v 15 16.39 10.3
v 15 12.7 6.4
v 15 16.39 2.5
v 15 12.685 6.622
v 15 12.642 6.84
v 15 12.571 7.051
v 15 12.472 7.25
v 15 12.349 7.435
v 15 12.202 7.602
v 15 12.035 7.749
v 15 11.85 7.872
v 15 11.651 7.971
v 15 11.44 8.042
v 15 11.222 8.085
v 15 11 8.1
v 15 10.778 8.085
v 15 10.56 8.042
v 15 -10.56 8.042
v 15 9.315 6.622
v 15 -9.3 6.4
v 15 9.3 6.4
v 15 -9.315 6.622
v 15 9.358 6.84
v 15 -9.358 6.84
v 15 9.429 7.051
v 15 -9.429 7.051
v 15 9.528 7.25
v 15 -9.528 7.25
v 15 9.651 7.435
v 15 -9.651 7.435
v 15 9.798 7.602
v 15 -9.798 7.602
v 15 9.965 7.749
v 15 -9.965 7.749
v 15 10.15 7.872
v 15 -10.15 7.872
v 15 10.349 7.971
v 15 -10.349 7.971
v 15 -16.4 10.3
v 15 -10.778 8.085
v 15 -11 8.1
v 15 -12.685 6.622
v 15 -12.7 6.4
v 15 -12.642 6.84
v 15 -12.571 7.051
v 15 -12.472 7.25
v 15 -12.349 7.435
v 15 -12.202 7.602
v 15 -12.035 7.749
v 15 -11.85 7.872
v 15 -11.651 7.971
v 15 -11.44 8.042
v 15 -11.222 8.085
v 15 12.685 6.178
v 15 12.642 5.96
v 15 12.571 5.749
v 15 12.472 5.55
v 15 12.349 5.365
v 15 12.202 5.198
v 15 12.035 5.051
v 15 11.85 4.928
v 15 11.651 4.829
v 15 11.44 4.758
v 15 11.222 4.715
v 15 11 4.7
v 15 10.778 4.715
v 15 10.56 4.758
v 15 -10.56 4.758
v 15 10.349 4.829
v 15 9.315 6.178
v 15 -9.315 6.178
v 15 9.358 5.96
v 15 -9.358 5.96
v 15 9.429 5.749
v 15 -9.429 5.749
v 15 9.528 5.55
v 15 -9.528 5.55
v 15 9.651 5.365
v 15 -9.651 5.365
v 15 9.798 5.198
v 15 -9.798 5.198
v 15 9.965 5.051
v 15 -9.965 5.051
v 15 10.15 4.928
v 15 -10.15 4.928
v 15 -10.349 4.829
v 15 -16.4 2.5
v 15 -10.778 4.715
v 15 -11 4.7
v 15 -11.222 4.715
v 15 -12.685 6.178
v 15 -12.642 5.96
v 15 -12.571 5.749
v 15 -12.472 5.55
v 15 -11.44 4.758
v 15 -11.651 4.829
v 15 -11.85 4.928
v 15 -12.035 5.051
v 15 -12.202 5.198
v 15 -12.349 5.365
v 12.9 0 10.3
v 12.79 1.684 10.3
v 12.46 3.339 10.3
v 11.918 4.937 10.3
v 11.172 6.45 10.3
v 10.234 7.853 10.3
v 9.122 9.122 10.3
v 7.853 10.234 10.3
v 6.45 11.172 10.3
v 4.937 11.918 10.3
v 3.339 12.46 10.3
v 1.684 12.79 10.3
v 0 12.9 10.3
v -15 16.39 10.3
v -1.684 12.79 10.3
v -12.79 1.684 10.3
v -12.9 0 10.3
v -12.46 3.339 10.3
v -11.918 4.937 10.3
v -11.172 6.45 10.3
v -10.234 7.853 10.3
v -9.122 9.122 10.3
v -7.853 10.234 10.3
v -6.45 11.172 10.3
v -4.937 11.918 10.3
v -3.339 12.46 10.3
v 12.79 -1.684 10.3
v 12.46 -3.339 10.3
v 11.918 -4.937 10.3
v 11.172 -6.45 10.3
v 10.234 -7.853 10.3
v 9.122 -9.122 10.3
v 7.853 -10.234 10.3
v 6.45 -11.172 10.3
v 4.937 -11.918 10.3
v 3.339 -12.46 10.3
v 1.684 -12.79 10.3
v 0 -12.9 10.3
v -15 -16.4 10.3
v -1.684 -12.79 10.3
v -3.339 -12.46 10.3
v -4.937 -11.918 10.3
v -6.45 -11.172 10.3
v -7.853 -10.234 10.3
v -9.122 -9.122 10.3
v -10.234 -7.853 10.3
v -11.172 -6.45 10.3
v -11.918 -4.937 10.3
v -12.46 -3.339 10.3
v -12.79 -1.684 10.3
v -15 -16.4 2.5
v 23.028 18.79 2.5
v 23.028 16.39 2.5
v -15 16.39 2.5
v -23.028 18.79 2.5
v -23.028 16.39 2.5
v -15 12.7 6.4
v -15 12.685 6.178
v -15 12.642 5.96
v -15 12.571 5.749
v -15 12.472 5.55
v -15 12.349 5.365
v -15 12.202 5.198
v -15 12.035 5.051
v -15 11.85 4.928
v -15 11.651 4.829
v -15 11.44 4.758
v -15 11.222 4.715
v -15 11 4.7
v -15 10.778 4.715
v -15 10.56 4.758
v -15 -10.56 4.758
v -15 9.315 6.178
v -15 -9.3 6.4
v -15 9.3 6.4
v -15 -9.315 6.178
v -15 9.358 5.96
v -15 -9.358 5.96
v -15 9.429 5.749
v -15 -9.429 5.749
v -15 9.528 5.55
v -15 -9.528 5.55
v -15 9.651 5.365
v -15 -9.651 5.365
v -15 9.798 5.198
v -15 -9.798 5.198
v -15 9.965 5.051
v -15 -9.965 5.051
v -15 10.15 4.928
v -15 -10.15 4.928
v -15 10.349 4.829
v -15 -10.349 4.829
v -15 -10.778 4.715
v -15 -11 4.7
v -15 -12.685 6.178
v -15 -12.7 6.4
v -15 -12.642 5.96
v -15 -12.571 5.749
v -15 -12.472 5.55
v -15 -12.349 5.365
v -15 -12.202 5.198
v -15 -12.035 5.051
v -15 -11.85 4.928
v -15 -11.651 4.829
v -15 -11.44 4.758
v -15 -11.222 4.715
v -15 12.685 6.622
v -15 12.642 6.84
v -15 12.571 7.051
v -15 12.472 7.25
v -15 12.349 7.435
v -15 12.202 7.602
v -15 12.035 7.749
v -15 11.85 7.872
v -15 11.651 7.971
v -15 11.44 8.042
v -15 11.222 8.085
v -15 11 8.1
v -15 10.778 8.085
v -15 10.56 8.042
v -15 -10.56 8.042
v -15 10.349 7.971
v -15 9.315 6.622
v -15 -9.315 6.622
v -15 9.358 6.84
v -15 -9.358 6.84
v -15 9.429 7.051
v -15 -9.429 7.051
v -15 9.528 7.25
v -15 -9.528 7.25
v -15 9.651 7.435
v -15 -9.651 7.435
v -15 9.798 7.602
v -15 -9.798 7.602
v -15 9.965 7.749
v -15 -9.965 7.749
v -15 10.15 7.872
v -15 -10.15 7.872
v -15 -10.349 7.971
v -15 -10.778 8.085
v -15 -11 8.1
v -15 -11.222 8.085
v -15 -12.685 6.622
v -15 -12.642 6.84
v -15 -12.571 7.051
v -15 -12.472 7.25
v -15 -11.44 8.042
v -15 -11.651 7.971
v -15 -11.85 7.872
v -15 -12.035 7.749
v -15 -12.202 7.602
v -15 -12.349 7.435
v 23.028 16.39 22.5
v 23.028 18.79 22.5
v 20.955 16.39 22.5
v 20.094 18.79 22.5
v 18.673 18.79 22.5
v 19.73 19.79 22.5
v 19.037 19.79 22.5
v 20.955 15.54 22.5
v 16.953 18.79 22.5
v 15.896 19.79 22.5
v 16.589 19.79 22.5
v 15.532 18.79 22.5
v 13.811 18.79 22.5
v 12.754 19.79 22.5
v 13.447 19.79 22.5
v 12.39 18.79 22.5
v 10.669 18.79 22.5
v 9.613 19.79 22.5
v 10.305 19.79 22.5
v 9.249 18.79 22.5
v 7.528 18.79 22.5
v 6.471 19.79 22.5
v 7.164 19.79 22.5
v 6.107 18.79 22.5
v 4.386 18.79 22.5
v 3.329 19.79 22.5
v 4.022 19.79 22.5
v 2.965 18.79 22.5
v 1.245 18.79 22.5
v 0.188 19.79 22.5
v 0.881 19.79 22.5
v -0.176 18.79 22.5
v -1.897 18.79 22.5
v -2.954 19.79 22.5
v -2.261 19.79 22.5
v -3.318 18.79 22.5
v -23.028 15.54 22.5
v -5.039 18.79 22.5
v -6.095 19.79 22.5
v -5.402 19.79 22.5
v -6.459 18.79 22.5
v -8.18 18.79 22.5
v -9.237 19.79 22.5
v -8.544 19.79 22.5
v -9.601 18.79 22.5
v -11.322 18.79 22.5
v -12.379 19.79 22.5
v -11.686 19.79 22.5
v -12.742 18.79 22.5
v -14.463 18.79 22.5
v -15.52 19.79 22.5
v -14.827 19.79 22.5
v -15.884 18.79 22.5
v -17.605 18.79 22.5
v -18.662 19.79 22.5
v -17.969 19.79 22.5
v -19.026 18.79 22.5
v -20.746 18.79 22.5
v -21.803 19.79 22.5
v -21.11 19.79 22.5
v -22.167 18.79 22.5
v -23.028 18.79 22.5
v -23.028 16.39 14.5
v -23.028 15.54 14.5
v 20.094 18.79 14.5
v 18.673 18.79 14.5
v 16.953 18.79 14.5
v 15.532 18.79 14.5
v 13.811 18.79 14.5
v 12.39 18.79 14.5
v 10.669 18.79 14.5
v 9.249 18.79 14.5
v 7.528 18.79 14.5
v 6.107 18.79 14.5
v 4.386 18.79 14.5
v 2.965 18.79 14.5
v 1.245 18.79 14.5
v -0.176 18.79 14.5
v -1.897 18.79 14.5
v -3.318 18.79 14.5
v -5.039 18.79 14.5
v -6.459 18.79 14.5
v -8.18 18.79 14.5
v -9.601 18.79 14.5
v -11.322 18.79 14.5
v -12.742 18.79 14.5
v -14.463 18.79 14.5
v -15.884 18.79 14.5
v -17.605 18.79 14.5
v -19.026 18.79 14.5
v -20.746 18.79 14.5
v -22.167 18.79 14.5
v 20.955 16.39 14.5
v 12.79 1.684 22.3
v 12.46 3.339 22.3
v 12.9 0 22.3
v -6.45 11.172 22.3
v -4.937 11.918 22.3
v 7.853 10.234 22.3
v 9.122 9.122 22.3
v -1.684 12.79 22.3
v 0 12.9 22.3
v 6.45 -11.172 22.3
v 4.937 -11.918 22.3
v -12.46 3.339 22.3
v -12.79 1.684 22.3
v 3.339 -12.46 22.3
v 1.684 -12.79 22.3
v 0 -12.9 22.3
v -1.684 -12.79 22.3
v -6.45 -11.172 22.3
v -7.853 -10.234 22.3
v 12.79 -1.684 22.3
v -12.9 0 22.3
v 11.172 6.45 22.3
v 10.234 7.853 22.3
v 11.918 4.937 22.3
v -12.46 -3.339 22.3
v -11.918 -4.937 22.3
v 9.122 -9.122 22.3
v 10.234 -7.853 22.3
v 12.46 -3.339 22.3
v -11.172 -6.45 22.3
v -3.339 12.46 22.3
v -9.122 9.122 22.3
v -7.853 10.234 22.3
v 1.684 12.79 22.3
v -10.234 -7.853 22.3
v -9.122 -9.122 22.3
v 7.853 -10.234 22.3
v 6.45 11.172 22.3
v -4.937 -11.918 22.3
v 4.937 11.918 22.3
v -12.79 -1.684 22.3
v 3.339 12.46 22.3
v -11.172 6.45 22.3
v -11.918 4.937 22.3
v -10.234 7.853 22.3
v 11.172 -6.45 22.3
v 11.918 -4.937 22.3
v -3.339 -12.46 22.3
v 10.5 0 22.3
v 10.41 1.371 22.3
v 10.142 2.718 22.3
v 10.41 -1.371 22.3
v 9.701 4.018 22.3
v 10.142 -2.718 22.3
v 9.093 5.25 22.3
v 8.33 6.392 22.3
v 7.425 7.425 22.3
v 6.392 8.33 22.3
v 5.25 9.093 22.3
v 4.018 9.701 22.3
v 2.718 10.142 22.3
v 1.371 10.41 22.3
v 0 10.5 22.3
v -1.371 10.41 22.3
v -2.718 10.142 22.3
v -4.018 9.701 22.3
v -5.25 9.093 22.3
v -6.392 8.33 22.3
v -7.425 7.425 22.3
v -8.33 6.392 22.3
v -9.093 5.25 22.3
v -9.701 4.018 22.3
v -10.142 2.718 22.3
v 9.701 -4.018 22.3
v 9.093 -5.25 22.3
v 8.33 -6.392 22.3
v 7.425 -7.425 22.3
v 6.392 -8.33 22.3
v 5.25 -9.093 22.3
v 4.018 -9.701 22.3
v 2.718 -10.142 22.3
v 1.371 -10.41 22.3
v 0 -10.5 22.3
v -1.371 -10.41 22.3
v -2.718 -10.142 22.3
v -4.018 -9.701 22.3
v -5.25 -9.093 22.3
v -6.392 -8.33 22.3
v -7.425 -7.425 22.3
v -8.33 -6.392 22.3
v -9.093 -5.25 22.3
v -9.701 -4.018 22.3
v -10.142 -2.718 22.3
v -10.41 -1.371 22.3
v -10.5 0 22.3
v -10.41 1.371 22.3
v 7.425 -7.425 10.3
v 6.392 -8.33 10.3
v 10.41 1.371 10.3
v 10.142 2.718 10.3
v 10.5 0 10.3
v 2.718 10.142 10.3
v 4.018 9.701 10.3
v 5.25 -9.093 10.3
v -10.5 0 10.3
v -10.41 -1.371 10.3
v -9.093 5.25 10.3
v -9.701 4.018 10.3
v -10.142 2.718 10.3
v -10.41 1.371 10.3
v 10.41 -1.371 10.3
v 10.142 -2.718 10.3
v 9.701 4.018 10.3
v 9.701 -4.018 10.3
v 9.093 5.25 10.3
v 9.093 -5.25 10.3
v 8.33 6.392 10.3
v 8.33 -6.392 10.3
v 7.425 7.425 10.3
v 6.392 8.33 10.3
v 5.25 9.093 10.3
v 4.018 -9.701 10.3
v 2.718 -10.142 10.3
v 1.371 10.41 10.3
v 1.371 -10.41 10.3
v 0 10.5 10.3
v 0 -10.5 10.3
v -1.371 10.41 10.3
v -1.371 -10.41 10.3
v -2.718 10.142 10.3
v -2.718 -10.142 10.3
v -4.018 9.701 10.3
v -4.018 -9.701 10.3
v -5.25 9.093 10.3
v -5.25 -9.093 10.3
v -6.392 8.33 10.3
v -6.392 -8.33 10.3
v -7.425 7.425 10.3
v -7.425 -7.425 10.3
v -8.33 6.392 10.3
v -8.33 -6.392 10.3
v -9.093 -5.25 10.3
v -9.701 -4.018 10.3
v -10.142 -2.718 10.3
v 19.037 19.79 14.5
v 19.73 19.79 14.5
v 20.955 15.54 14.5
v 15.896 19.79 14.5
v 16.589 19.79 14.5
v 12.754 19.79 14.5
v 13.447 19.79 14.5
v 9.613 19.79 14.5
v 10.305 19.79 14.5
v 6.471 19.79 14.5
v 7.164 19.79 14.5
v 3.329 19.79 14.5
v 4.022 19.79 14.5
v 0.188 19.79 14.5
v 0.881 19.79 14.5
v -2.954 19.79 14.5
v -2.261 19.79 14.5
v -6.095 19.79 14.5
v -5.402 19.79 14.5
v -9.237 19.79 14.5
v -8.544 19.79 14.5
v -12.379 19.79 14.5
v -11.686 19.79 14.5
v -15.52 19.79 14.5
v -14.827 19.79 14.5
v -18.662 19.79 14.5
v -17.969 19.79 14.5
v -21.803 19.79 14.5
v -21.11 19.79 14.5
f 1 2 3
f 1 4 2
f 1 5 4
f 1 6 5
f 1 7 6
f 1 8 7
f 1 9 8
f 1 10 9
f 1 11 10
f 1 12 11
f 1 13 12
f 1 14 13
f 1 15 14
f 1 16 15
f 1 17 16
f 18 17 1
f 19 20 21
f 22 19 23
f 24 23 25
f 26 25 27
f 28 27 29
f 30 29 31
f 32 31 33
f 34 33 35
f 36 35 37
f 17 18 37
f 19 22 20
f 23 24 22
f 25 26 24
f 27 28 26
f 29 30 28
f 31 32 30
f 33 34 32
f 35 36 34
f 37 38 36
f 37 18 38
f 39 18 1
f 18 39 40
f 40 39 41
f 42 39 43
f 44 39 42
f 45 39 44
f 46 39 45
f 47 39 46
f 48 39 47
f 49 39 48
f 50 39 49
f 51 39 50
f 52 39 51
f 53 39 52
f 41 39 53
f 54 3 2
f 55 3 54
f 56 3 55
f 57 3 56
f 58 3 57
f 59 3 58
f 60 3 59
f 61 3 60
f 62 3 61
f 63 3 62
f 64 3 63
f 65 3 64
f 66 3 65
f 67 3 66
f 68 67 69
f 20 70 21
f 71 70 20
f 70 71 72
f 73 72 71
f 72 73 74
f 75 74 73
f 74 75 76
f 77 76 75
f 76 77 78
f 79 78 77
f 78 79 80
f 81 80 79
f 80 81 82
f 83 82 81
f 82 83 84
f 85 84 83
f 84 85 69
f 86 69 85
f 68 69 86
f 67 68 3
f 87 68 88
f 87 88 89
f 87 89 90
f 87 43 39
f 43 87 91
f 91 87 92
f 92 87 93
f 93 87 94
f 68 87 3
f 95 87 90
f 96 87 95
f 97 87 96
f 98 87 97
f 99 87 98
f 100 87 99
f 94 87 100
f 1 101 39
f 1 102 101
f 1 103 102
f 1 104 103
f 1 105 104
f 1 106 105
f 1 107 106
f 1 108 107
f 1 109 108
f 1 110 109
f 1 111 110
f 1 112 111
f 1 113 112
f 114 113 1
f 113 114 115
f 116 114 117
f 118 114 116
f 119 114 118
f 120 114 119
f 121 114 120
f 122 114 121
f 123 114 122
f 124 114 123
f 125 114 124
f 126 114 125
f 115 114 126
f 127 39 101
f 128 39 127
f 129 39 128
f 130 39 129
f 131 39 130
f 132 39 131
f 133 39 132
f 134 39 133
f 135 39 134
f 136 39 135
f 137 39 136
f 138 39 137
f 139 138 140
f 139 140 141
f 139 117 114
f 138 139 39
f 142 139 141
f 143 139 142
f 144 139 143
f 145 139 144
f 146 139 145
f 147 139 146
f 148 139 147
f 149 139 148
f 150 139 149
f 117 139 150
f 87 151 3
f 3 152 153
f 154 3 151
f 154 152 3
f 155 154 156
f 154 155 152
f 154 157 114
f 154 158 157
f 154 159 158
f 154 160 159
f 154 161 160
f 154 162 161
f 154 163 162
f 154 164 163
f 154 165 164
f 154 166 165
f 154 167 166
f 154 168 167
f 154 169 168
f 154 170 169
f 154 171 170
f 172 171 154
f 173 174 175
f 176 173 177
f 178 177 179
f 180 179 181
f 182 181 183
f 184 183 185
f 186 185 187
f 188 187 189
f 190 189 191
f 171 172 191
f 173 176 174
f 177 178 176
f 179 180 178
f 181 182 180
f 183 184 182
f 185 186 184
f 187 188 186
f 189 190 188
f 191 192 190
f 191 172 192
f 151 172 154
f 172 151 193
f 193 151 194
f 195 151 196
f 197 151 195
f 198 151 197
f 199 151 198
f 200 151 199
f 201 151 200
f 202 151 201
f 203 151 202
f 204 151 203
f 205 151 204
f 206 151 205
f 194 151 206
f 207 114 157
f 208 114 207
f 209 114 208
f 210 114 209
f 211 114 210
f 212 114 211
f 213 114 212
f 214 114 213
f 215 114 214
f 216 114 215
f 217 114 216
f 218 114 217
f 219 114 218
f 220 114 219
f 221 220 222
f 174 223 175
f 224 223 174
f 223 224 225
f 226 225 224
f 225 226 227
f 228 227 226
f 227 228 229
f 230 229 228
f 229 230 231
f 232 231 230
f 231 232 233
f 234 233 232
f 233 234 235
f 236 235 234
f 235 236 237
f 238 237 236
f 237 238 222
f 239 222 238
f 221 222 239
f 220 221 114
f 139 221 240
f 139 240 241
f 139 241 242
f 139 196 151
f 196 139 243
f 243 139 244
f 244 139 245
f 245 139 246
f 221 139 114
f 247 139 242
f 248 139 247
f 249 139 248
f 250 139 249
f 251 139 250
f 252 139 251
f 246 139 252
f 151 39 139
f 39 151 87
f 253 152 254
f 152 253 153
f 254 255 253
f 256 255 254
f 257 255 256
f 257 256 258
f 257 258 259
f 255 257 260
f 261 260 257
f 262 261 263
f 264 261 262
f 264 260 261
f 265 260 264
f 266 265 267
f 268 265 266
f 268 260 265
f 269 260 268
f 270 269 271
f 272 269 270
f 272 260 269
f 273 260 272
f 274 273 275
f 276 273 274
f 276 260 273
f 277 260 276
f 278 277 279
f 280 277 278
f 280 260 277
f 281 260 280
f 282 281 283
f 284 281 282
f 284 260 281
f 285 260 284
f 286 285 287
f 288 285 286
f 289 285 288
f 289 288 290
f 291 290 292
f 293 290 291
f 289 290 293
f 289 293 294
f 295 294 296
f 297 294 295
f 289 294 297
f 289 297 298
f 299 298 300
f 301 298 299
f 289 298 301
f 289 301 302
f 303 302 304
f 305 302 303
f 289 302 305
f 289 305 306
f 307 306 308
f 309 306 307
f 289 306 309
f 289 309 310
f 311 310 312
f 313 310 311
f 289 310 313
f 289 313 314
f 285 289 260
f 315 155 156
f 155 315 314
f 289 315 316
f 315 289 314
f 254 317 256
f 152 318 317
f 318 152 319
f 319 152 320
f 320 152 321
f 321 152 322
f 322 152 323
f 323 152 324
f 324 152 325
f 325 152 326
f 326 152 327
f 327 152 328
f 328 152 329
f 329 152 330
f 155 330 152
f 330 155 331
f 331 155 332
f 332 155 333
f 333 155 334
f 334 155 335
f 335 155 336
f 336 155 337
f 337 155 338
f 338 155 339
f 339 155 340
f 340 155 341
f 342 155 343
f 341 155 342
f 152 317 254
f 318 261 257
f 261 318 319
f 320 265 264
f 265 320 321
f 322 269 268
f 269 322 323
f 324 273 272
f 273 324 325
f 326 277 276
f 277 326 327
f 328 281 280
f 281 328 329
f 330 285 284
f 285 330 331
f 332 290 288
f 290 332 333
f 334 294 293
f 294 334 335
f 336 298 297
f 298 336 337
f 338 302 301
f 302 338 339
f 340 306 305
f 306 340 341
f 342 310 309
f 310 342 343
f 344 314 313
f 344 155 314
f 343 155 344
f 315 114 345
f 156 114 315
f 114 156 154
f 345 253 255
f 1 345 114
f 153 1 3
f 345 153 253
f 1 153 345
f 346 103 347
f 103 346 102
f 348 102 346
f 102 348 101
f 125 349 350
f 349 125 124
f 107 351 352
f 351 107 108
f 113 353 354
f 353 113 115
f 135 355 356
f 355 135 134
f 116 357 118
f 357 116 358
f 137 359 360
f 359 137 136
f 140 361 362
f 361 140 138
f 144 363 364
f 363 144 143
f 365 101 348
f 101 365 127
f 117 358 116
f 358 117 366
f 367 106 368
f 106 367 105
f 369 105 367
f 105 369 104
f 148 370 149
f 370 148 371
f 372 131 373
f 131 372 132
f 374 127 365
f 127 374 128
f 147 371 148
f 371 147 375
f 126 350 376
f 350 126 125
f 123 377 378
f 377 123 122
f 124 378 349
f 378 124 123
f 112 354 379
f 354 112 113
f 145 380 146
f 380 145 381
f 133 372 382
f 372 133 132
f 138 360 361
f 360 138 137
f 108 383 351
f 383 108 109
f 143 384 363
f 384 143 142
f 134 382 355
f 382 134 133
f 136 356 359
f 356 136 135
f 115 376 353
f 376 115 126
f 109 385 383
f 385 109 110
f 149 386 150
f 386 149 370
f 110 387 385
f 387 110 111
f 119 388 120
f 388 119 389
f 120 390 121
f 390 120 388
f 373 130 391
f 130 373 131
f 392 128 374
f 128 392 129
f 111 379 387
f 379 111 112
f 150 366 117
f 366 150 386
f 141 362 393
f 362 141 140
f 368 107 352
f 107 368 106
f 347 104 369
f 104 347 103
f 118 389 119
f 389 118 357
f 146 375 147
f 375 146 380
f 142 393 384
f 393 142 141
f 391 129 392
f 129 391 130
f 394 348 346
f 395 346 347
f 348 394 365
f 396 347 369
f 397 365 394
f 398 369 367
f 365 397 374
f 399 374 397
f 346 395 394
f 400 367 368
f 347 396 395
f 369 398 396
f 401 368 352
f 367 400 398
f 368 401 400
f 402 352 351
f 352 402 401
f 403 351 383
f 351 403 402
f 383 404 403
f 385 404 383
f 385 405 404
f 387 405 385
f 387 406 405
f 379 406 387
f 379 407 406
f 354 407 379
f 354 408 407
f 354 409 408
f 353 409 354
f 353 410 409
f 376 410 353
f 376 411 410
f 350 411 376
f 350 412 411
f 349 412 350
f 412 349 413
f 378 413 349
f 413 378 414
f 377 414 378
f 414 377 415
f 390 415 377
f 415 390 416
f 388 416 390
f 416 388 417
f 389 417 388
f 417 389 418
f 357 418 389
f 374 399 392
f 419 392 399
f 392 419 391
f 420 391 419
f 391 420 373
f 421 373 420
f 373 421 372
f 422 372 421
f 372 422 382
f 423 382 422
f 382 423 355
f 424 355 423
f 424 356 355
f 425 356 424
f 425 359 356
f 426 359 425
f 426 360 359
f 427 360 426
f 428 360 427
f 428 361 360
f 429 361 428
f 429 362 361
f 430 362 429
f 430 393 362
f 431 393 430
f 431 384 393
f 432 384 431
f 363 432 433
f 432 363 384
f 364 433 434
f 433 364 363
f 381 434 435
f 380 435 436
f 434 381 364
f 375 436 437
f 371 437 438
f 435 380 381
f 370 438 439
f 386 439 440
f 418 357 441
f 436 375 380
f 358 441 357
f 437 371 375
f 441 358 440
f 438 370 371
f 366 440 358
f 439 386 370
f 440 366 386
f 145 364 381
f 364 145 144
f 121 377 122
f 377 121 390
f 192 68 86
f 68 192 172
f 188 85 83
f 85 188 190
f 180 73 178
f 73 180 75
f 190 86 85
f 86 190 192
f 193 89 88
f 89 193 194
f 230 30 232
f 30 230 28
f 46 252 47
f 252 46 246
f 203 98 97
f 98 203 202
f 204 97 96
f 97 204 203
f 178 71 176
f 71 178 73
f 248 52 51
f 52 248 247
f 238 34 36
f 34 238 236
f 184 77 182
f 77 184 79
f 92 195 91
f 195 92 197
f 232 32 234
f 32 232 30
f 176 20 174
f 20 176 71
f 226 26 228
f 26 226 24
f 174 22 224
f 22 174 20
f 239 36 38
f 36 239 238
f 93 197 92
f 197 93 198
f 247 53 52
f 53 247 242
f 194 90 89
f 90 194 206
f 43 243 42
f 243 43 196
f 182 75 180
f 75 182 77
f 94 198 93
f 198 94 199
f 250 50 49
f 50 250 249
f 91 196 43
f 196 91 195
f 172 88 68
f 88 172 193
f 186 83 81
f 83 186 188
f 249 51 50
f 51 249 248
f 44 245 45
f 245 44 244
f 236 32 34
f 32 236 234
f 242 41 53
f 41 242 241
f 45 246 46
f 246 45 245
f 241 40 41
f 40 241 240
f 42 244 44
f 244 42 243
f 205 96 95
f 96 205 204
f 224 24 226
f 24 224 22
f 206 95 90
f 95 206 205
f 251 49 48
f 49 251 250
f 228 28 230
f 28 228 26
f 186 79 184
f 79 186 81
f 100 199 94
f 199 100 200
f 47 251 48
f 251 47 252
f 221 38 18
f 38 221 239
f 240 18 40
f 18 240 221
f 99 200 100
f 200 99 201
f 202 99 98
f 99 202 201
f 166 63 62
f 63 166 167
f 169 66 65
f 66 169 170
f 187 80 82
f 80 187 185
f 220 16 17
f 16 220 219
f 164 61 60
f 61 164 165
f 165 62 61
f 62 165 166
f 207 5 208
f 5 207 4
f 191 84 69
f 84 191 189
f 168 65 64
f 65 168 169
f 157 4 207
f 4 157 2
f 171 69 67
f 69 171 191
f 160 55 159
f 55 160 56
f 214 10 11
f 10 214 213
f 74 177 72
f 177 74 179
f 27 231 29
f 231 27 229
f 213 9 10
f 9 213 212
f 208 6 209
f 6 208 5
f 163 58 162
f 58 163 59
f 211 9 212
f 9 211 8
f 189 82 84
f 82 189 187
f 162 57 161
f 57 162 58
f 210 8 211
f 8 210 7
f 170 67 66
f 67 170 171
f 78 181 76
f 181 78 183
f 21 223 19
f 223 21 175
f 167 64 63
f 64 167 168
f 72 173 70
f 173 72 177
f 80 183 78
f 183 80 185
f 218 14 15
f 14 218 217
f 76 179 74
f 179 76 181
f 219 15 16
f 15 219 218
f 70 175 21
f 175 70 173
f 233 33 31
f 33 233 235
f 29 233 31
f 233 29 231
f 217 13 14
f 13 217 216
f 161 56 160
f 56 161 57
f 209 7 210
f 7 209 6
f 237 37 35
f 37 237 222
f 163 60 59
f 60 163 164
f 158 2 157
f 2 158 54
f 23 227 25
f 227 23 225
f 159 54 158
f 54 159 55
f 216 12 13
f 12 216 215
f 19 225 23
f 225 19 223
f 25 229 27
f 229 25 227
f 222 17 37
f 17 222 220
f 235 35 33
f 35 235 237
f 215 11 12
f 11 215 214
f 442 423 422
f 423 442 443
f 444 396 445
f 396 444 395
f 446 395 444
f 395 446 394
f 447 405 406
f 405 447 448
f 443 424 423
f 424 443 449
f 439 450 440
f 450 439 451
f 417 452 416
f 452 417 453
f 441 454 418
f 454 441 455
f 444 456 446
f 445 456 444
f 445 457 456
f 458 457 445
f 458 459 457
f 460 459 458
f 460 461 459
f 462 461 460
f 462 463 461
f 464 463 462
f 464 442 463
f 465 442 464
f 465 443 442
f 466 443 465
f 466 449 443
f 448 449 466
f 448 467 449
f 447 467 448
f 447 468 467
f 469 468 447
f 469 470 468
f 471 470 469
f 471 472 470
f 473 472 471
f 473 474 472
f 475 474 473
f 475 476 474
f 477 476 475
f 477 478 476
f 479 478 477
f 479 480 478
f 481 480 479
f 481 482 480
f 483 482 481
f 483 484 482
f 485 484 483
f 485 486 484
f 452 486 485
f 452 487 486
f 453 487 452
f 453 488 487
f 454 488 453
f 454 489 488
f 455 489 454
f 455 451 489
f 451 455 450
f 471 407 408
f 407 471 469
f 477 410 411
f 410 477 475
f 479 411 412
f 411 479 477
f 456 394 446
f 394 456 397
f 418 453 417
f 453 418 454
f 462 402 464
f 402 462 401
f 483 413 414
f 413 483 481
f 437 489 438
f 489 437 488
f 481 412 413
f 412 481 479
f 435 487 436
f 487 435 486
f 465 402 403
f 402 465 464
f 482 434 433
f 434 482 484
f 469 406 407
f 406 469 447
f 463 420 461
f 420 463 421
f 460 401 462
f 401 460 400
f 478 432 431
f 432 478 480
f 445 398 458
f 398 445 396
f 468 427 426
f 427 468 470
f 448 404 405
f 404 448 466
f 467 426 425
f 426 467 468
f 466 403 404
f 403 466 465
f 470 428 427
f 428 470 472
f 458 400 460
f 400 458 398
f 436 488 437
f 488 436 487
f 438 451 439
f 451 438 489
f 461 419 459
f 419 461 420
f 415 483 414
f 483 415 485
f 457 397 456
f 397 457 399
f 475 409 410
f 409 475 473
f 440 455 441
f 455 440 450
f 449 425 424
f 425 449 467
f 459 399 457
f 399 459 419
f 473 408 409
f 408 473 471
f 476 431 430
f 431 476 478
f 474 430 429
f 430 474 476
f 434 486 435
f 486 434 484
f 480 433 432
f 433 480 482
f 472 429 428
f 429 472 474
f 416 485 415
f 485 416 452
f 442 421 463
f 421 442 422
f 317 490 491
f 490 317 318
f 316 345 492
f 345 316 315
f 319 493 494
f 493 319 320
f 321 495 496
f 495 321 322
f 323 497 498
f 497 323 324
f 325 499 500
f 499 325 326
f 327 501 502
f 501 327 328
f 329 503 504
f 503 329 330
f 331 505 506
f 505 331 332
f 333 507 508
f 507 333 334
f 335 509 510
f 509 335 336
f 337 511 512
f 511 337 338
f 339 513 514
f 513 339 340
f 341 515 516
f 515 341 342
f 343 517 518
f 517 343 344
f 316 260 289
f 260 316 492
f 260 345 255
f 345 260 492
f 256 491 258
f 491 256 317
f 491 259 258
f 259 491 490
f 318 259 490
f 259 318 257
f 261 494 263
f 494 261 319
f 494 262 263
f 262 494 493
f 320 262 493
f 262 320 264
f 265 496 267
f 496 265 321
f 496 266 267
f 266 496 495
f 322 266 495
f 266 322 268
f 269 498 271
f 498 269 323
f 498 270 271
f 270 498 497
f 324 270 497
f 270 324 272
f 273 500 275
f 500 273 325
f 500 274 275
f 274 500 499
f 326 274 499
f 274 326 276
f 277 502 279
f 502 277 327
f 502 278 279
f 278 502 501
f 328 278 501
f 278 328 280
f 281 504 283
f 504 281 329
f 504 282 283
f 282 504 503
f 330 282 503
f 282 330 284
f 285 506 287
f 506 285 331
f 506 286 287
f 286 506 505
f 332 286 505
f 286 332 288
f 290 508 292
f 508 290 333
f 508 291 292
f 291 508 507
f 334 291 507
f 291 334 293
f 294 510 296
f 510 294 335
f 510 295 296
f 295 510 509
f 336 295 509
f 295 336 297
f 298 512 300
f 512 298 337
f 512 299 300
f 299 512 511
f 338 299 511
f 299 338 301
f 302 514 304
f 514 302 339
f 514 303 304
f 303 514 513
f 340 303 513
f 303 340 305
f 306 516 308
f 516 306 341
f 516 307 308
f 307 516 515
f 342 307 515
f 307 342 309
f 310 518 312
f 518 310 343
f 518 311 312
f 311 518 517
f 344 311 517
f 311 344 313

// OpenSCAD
/* =====================================================================
   Bittle CoM-Shift Harness  —  parametric v0
   Single Petoi P1S servo · rack-and-pinion linear slider · diagonal mount
   ---------------------------------------------------------------------
   Units: millimetres, degrees.  Print PLA/PETG for v0.
   Use a STEEL guide rod (rod_dia) rather than printing the sliding
   surface — printed-on-printed prismatic joints bind badly.

   TWO THINGS TO VERIFY ON THE BENCH (not trustworthy from the render):
     1. Pinion<->rack CENTRE DISTANCE. Tune with 'backlash'/'center_extra'.
     2. Z registration of pinion face vs rack face ('mesh_z').
   Everything else is dimensionally driven by the parameters below.
   ===================================================================== */

/* ---------- PART SELECTOR ------------------------------------------ */
// "layout" = assembled visualisation; the rest export a single flat part
part = "carriage";   // ["layout","base","carriage","pinion","rack"]

/* ---------- ROBOT / DECK ------------------------------------------- */
deck_len   = 100;  // electronics deck, long edge  (measure next week)
deck_wid   = 50;   // electronics deck, short edge
robot_mass = 290;  // g, bare Bittle
mech_mass  = 45;   // g, est. servo + harness + rack (refine after weighing)
m_shift    = 100;  // g, swappable payload slug  <-- your independent variable

/* ---------- SERVO (Petoi P1S: 30x24x12, 270 deg, 3 kg.cm) ---------- */
servo_l = 30; servo_w = 24; servo_h = 12;  // body envelope
servo_travel  = 270;                        // usable degrees
servo_shaft_d = 5;                          // shaft / horn-boss clearance

/* ---------- GEAR --------------------------------------------------- */
gear_module    = 1.0;   // >=1 so printed teeth survive
pinion_teeth   = 17;    // pitch dia = module * teeth
pressure_angle = 20;
pinion_face    = 6;     // pinion thickness  (Z)
rack_face      = 8;     // rack tooth height (Z)
backlash       = 0.15;  // mm, thinned per flank
center_extra   = 0.0;   // mm, add to centre distance to loosen mesh

/* ---------- GUIDE / CARRIAGE --------------------------------------- */
rod_dia       = 3.0;    // steel guide rods
rod_spacing   = 22;     // centre-to-centre (anti-rotation)
carriage_len  = 30;
mass_pocket_d = 21;     // shallow well for stacked ~20mm washers / M6 nuts
mass_pocket_h = 12;     // keep shallow: taller = higher CoM = tippier
clr           = 0.4;    // general slip-fit clearance

/* ---------- BASE --------------------------------------------------- */
base_th      = 2.5;
strap_slot_w = 4;       // velcro / zip-tie slots to strap over the deck
wall         = 2.4;

$fn = 48;

/* ========================= DERIVED ================================= */
pitch_r  = gear_module * pinion_teeth / 2;
stroke   = pitch_r * servo_travel * PI / 180;      // rack travel for full sweep
M_total  = robot_mass + mech_mass + m_shift;
dx_com   = m_shift * stroke / M_total;             // 1-D CoM shift magnitude
diag_ang = atan2(deck_wid, deck_len);              // diagonal orientation
rack_len = stroke + 6 * gear_module;               // keep meshed across travel

// carriage cross-width (Y): must clear both rods AND the mass well
cw = max(rod_spacing + 2*rod_dia + 2*wall, mass_pocket_d + 2*wall + 2);

// heights
rod_z   = base_th + rod_dia/2 + wall;              // rod centreline above plate
mesh_z  = base_th + servo_h;                       // servo lies flat, shaft up
y_rack  = cw/2 + wall;                             // rack pitch-line Y (local, at wall face)
y_pin   = y_rack + pitch_r + center_extra;         // pinion centre Y (local)
RL      = (stroke + carriage_len)/2 + 8;           // rail half-length

echo(str(">>> pinion pitch dia = ", 2*pitch_r, " mm"));
echo(str(">>> usable stroke    = ", stroke, " mm  over ", servo_travel, " deg"));
echo(str(">>> diagonal angle   = ", diag_ang, " deg (fore/aft:lateral set by deck)"));
echo(str(">>> total mass       = ", M_total, " g"));
echo(str(">>> predicted CoM shift = ", dx_com, " mm  @ ", m_shift, " g payload"));

/* ========================= GEAR MATH =============================== */
function polar(r,a) = [r*cos(a), r*sin(a)];
function rot2(p,a)  = [p[0]*cos(a)-p[1]*sin(a), p[0]*sin(a)+p[1]*cos(a)];
function inv_deg(a) = (tan(a) - a*PI/180) * 180/PI;   // involute fn, deg->deg

gsteps = 14;
function flank(br,ar) =
   let(t_out = acos(br/ar))
   [ for(i=[0:gsteps]) let(t = i/gsteps*t_out, r = br/cos(t))
        polar(r, inv_deg(t)) ];

// involute spur pinion, centred on origin, in XY.
// Built as SOLID HUB + narrowing teeth so it extrudes to a closed manifold.
module pinion_2d(){
   pr = pitch_r;
   br = pr*cos(pressure_angle);          // base circle
   ar = pr + gear_module;                // addendum (outer) radius
   rr = pr - 1.25*gear_module;           // root radius
   bl_ang   = (backlash/pr)*180/PI;      // backlash expressed as angle
   half     = 90/pinion_teeth - bl_ang/2;// half-tooth angular width at pitch
   base_ang = half + inv_deg(pressure_angle);
   t_out    = acos(br/ar);
   // flank root->tip, +side; angle DECREASES with radius so teeth narrow
   left  = concat([ polar(rr, base_ang) ],
                  [ for(i=[0:gsteps]) let(t=i/gsteps*t_out, r=br/cos(t))
                       polar(r, base_ang - inv_deg(t)) ]);
   right = [ for(i=[len(left)-1:-1:0]) [left[i][0], -left[i][1]] ]; // tip->root, mirrored
   tooth = concat(left, right);
   union(){
      circle(r = rr + 0.02);             // solid hub the teeth attach to
      for(k=[0:pinion_teeth-1]) rotate(k*360/pinion_teeth) polygon(tooth);
   }
}

module pinion(){
   difference(){
      linear_extrude(pinion_face) pinion_2d();
      translate([0,0,-1]) cylinder(d=servo_shaft_d+clr, h=pinion_face+2); // shaft clr
      // counterbore to seat a metal servo horn (bolt the pinion to it)
      translate([0,0,pinion_face-2.5]) cylinder(d=16, h=3);
      // 4x M2 bolt circle for the horn
      for(k=[0:3]) rotate(k*90) translate([6,0,-1]) cylinder(d=2.2, h=pinion_face+2);
   }
}

// straight-flank rack (exact conjugate of the involute pinion), teeth +Y
module rack_2d(len){
   p   = PI*gear_module;                 // circular pitch
   n   = floor(len/p);
   add = gear_module;                    // addendum (up)
   ded = 1.25*gear_module;               // dedendum (down)
   ht  = p/4 - backlash/2;               // half tooth thickness at pitch line
   base_h = 2;                           // solid backing below root
   union(){
      translate([0, -(ded+base_h)]) square([n*p, base_h]);          // backing strip
      for(i=[0:n-1]) let(cx=(i+0.5)*p)
         polygon([[cx-(ht+ded*tan(pressure_angle)), -ded],
                  [cx-(ht-add*tan(pressure_angle)),  add],
                  [cx+(ht-add*tan(pressure_angle)),  add],
                  [cx+(ht+ded*tan(pressure_angle)), -ded]]);
   }
}
module rack(){ linear_extrude(rack_face) rack_2d(rack_len); }

/* ========================= CARRIAGE ================================ */
// slides on the two rods (X), carries the rack wall (+Y) and the mass well
module carriage(){
   ch = rod_dia + 2*wall;                        // body height around rods
   wall_h = mesh_z + rack_face;                  // rack wall rises to mesh plane
   difference(){
      union(){
         // body block straddling the rods
         translate([-carriage_len/2, -cw/2, base_th]) cube([carriage_len, cw, ch]);
         // tall +Y wall that carries the rack up at the mesh plane
         translate([-rack_len/2, cw/2-0.01, base_th])
            cube([rack_len, wall, wall_h-base_th]);
         // mass well (cup) centred on the carriage
         translate([0,0,base_th])
            cylinder(d=mass_pocket_d+2*wall, h=ch+mass_pocket_h);
      }
      // rod bores (slip fit)
      for(sy=[-1,1])
         translate([-carriage_len/2-1, sy*rod_spacing/2, base_th+ch/2])
            rotate([0,90,0]) cylinder(d=rod_dia+clr, h=carriage_len+2);
      // mass pocket cavity, open from top
      translate([0,0,base_th+ch]) cylinder(d=mass_pocket_d, h=mass_pocket_h+1);
   }
   // rack teeth on the outer face of the +Y wall, at the mesh plane
   translate([-rack_len/2, cw/2+wall-0.01, mesh_z]) rack();
}

/* ========================= BASE ==================================== */
// deck-shaped plate with strap slots + rail furniture on the diagonal
module plate(){
   difference(){
      translate([-deck_len/2,-deck_wid/2,0]) cube([deck_len,deck_wid,base_th]);
      // strap slots near the four edges
      for(sx=[-1,1]) translate([sx*(deck_len/2-8), 0, -1])
         cube([strap_slot_w, deck_wid*0.6, base_th+2], center=true);
   }
}

// rail furniture in a LOCAL frame (rail along +X); rotated onto plate below
module rail_furniture(show_moving){
   // end bosses holding the rod ends
   for(sx=[-1,1])
      translate([sx*RL, 0, base_th]) difference(){
         translate([-3, -(rod_spacing/2+rod_dia+wall), 0])
            cube([6, rod_spacing+2*rod_dia+2*wall, rod_dia+2*wall]);
         for(sy=[-1,1])
            translate([-4, sy*rod_spacing/2, (rod_dia+2*wall)/2])
               rotate([0,90,0]) cylinder(d=rod_dia+0.1, h=8);   // rod press/glue
      }
   // servo cradle at travel centre (pinion sits at x=0 so rack stays meshed)
   translate([0, y_pin, base_th]) difference(){
      translate([-(servo_l/2+wall), -(servo_w/2+wall), 0])
         cube([servo_l+2*wall, servo_w+2*wall, servo_h+wall]);
      translate([-servo_l/2, -servo_w/2, wall]) cube([servo_l, servo_w, servo_h+1]);
      translate([0,0,-1]) cylinder(d=servo_shaft_d+2, h=servo_h+wall+2);   // shaft slot
   }
   if(show_moving){
      // guide rods (visual)
      color("silver") for(sy=[-1,1])
         translate([-RL, sy*rod_spacing/2, rod_z]) rotate([0,90,0])
            cylinder(d=rod_dia, h=2*RL);
      // pinion on the shaft
      color("tomato") translate([0, y_pin, mesh_z]) pinion();
   }
}

module base(){
   plate();
   rotate([0,0,diag_ang]) rail_furniture(false);
}

/* ========================= ASSEMBLY / EXPORT ======================= */
module layout(){
   color("lightsteelblue") plate();
   rotate([0,0,diag_ang]){
      rail_furniture(true);
      // carriage shown at travel centre, with a translucent slug
      color("khaki")   carriage();
      color([1,0.9,0.4,0.4]) translate([0,0,mesh_z])
         cylinder(d=mass_pocket_d-1, h=mass_pocket_h-2);
   }
}

if      (part=="layout")   layout();
else if (part=="base")     base();
else if (part=="carriage") carriage();
else if (part=="pinion")   pinion();
else if (part=="rack")     rack();

/* =====================================================================
   BOM (v0)
     - 1x Petoi P1S servo  + metal round horn (bolt pinion to it)
     - 2x steel rod, dia = rod_dia, length ~ 2*RL  (cut to fit bosses)
     - swappable slug: stacked steel washers / M6 nuts / tungsten
     - 4x M2 screws (pinion->horn), velcro or zip-ties (strap slots)
   PRINT NOTES
     - pinion & rack: 100% infill, fine layers; module>=1 for tooth strength
     - the tall +Y rack wall is thin — add a gusset if it flexes
     - firmware: NyBoard's PCA9685 has spare channels beyond Bittle's 9;
       wire this servo to a free channel and index it as a 10th joint
   ===================================================================== */
